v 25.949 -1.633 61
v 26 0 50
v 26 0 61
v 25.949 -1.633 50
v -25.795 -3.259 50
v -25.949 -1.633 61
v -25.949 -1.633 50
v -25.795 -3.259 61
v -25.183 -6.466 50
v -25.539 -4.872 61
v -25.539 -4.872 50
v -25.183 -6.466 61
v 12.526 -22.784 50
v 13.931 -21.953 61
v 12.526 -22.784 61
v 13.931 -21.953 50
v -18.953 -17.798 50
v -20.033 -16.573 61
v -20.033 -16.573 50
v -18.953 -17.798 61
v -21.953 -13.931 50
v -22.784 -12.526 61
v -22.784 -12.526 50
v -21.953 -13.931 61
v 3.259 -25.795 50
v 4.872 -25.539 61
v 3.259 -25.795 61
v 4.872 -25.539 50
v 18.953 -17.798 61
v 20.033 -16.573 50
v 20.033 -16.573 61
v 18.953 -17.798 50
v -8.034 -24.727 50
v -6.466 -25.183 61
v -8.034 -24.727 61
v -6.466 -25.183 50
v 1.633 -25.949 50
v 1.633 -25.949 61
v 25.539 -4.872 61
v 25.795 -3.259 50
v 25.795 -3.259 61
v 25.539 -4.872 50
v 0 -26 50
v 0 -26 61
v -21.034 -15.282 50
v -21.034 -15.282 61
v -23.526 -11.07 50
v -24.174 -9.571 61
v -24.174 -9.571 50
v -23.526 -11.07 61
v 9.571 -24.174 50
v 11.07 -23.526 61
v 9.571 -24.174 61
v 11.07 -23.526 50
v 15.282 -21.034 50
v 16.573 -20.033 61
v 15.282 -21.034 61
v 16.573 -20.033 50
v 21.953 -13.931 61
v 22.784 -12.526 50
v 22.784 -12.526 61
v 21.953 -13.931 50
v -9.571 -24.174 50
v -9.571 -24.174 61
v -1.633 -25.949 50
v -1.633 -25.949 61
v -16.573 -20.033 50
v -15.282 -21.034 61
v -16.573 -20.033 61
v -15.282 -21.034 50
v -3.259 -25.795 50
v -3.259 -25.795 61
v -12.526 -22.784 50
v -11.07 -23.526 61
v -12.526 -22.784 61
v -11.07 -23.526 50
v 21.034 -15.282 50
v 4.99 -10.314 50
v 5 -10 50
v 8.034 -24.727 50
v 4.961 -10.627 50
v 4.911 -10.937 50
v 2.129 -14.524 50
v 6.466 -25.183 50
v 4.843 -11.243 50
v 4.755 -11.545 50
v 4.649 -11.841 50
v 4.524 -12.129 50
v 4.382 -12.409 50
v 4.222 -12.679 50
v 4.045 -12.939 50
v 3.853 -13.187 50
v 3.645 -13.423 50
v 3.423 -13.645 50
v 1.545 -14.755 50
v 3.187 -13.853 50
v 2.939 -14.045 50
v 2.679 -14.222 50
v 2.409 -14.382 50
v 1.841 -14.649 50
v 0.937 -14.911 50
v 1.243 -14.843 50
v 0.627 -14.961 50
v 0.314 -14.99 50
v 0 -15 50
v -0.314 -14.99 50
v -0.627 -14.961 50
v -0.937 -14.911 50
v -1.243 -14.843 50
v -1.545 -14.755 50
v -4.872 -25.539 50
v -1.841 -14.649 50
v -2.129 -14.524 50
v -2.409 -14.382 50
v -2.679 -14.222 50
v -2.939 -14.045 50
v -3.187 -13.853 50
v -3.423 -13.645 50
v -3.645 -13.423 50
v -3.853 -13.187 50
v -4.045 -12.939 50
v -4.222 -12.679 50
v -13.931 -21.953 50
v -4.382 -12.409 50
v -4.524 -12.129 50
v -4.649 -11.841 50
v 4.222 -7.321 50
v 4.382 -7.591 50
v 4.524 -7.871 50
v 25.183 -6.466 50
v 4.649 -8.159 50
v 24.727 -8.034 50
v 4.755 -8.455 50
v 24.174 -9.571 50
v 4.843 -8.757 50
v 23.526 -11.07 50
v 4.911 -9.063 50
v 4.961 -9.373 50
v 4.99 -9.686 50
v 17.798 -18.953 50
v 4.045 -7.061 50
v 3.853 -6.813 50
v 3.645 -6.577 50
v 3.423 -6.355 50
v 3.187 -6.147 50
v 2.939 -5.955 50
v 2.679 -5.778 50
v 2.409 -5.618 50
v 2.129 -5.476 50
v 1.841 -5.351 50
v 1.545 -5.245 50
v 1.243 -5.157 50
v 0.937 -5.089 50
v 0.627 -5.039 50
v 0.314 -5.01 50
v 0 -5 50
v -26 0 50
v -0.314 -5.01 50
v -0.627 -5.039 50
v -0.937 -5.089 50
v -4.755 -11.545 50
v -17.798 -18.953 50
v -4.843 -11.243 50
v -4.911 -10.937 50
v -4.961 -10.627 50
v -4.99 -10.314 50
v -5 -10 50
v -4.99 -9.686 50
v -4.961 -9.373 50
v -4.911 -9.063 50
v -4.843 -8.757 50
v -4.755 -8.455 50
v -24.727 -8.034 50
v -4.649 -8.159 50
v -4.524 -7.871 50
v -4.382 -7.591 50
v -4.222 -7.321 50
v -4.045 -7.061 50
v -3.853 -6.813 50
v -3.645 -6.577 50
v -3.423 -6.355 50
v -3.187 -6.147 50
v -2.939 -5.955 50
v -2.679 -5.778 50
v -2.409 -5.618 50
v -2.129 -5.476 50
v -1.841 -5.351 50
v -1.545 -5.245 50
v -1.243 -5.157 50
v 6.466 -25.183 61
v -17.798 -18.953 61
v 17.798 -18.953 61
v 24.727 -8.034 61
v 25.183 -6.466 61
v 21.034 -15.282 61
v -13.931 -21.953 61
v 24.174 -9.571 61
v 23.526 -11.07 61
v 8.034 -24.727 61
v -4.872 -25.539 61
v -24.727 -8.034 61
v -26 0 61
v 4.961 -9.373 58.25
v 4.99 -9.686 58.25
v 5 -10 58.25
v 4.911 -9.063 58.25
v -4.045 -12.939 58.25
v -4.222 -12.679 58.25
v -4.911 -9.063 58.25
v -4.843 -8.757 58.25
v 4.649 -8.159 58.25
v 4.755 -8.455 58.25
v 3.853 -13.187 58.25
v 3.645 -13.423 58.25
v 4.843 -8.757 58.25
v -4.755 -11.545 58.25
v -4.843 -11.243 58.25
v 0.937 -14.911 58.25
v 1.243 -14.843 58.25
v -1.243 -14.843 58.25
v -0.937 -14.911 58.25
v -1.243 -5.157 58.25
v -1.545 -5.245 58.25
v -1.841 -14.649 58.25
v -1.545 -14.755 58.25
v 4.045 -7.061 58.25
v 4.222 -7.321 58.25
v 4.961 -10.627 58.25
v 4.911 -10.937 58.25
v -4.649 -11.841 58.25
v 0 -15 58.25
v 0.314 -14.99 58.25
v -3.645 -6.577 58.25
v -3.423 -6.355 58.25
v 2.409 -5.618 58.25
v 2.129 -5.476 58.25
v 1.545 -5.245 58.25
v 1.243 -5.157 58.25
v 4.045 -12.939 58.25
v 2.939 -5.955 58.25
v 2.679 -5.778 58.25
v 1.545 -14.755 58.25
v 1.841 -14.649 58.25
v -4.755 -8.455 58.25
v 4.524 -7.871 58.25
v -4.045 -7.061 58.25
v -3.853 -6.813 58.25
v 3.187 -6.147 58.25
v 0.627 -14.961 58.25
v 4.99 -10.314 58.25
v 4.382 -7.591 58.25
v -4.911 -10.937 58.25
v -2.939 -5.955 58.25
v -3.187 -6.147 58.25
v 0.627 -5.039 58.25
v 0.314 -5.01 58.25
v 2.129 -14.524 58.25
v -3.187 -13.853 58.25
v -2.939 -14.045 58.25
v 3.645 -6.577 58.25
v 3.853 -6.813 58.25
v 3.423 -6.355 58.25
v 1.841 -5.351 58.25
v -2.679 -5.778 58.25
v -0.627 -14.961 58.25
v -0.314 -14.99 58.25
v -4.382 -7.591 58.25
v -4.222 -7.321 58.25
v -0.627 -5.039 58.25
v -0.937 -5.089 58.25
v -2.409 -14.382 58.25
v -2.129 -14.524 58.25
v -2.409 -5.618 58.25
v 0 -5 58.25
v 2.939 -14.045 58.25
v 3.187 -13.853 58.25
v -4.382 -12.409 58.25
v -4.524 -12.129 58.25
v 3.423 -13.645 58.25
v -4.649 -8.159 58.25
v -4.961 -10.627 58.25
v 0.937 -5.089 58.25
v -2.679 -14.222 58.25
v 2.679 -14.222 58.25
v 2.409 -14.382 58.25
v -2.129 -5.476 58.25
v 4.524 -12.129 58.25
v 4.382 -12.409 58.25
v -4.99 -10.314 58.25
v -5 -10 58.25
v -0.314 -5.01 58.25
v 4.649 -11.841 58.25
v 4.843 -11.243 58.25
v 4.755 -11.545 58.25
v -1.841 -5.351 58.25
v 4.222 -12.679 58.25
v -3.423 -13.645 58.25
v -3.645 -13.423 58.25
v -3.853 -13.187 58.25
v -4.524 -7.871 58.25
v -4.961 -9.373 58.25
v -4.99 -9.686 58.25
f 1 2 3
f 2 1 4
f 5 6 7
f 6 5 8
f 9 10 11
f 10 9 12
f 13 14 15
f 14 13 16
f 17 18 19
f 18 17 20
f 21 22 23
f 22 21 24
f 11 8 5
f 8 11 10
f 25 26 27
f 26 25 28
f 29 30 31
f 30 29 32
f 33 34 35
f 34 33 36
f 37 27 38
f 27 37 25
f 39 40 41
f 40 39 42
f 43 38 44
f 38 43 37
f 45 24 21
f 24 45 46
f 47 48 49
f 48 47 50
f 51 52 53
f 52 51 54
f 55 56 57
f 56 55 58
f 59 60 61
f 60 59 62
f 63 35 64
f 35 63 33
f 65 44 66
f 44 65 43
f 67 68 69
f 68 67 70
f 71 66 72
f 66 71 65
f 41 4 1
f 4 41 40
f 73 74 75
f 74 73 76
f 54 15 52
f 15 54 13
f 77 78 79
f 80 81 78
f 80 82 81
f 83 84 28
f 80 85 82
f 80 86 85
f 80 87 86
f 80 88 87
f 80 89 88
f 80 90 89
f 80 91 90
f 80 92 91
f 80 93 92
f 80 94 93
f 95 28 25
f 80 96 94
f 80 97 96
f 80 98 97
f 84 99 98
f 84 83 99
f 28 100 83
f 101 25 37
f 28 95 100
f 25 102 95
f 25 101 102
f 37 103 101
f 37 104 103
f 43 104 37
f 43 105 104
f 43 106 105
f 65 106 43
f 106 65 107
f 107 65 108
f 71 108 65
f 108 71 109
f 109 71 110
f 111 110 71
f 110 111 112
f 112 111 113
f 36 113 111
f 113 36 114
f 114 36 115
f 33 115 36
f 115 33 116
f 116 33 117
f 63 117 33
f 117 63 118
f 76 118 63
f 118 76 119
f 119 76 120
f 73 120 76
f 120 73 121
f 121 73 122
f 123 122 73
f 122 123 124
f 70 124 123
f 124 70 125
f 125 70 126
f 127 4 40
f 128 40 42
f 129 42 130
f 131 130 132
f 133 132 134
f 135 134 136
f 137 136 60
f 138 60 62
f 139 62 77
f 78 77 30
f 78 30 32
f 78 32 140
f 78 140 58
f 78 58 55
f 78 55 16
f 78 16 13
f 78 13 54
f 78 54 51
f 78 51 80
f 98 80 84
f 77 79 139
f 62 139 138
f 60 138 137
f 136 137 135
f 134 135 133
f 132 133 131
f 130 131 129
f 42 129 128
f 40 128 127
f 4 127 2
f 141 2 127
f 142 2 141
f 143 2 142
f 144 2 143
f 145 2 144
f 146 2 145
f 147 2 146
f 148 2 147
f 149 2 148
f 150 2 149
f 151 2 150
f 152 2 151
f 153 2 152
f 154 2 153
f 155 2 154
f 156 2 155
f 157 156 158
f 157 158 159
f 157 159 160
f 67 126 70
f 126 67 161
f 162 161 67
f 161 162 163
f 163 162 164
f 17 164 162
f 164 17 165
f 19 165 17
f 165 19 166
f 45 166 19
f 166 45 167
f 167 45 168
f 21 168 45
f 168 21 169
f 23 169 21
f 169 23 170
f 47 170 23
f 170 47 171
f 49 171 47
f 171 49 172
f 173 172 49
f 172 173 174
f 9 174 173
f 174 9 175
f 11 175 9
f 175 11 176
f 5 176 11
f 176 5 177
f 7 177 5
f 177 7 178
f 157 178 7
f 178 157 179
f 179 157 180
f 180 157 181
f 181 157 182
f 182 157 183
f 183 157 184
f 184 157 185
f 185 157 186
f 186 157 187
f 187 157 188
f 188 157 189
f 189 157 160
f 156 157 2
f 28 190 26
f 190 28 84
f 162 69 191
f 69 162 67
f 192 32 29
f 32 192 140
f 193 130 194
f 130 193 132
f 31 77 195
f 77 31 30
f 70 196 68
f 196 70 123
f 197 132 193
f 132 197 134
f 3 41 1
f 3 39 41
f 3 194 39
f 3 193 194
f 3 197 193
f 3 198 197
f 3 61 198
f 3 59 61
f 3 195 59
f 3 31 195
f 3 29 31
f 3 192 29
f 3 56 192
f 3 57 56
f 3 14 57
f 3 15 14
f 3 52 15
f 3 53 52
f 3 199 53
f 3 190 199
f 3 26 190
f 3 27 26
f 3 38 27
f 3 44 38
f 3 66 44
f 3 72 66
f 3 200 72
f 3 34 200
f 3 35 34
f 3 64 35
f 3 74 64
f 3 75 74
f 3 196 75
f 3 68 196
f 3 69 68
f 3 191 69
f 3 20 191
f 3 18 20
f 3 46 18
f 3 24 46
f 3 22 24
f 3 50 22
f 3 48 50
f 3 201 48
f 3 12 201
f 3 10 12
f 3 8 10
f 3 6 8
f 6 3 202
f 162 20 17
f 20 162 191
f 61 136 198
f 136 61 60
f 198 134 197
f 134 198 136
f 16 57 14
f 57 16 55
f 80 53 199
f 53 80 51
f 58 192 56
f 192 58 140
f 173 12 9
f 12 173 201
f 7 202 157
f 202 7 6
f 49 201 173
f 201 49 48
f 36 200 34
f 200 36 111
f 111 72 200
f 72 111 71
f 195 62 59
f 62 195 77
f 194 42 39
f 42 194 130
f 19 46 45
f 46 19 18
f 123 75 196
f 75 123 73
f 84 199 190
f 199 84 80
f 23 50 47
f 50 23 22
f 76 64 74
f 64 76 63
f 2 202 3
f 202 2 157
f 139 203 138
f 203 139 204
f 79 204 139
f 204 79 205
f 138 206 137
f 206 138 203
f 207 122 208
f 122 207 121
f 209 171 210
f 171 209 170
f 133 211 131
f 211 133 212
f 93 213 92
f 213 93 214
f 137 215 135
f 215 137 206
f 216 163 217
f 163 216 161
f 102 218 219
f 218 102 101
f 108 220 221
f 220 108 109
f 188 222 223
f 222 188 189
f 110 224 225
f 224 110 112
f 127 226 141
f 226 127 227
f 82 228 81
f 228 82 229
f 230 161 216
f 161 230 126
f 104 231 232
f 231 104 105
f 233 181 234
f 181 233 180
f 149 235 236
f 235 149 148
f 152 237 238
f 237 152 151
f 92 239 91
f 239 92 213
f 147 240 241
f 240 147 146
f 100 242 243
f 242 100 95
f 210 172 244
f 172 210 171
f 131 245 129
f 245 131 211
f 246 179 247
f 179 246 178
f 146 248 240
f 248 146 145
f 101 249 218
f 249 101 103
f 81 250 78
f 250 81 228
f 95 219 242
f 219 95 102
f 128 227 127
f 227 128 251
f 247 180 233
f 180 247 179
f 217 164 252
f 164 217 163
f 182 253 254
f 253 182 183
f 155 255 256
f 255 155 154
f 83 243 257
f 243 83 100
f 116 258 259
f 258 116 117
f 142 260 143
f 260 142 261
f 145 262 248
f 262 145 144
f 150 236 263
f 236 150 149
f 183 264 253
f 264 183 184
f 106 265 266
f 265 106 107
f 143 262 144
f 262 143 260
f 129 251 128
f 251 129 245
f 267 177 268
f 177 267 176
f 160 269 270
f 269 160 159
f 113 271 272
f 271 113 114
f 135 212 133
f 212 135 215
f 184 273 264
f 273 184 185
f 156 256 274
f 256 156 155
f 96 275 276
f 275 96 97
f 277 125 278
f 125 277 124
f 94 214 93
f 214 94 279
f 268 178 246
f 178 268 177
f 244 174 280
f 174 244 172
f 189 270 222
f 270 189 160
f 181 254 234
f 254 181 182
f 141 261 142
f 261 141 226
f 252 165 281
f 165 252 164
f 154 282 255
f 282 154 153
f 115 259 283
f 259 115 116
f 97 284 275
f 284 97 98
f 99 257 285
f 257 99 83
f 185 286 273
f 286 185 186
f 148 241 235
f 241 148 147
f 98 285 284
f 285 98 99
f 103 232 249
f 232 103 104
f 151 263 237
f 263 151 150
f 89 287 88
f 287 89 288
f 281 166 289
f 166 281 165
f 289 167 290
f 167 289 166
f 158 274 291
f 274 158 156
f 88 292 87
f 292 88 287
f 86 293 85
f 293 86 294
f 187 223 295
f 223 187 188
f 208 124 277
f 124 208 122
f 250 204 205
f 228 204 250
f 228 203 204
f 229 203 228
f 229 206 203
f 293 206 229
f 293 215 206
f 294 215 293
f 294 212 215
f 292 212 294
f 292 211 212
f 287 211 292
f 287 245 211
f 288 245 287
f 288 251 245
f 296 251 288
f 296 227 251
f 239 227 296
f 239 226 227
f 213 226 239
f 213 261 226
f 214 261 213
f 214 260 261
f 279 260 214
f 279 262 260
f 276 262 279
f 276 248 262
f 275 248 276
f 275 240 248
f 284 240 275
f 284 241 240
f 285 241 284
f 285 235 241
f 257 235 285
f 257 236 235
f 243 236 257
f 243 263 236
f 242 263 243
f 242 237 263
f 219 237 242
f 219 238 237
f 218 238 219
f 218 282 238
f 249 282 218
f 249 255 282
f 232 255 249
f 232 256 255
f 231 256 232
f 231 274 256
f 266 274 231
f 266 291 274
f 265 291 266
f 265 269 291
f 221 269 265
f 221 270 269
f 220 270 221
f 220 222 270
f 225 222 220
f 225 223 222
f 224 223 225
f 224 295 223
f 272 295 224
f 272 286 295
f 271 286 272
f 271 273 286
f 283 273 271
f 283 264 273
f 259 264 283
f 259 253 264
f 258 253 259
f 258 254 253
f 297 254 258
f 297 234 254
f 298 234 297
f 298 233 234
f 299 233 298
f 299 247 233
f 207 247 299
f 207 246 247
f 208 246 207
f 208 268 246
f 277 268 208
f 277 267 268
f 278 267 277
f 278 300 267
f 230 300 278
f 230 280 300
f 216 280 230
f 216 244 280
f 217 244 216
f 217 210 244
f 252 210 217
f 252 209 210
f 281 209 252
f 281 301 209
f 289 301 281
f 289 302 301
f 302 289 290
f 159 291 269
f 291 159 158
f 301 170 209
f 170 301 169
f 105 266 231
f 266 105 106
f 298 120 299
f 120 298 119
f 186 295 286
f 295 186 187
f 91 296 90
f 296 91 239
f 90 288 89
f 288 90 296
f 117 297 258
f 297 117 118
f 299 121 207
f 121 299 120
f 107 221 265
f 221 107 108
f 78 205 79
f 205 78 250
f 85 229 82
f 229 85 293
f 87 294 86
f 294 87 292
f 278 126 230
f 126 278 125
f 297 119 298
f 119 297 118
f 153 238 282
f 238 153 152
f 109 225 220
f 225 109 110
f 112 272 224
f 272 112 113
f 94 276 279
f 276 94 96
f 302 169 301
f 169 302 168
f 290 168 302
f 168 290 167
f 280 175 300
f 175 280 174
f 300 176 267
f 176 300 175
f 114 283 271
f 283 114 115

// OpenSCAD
$fn=100;
//import("files/Minimalist_Laser_Microscope_End_Cap.stl");
/*
translate([0,-27,0]){
import("files/Minimalist_Laser_Microscope_Body.stl");
}
*/
/*

difference(){
    translate(v=[-18,0, 8.85]){
        rotate(90, [0,1,0]){
           cylinder(h = 14, r = 8);
            }
        }///trnaslate end
    translate(v=[-18,0, 8.85]){
        rotate(90, [0,1,0]){
           cylinder(h = 14, r = 5.1);
            }
        }///trnaslate end
            
}//difference end
*/





ech = 11; // cylinder end cap height
ecr = 26 ; // cylinder end cap radius

laserRadius = 5; // laser radius
syringeRadius = 16.5 / 2 ; // srynge radius
syringeRadius1 = 9.5 /2  ; // srynge radius at syringeHeight1
syringeRadius2 = 2  ; // srynge radius at syringeHeight1

syringeHeight = 58.5 ; // srynge height
syringeHeight1 = 10; //
syringeHeight2 = 23; //
syringeHeight3 = 25; //

module cap(){
    translate(v=[0,0,50]){
        difference(){
            cylinder(h = ech, r = ecr);
            translate(v=[-ecr,0,0]){
                cube([ecr*2, ecr, ech]);
            }
            translate(v=[0,-laserRadius - 5, 0]){
                cylinder(h = ech *3 / 4., r = laserRadius);
            }
        }
    }
}


module front(){
    translate(v=[0,0,-50]){ // t1
        difference(){
            //base
            union(){ //u1
                cylinder(h = 2.5*ech, r = ecr);
                translate(v=[0,-laserRadius - 5, ecr/4 + 4]){
                    rotate(90, [1,0,0]){
                        cylinder(h = syringeHeight, r = syringeRadius+2);
                    }
                }
            } //union u1end  

            translate(v=[-ecr*1.5,0,0]){
                cube([ecr*2.5, ecr, 2.5*ech]);
            }
            //laser hole
            translate(v=[0,-laserRadius - 5, ech*2-2.5]){
                cylinder(h = ech *3 / 4., r = laserRadius);
            }
            //pasing laser hole
            translate(v=[0,-laserRadius - 5, 0]){
                cylinder(h = ech*2.5, r = laserRadius*3/4.);
            }
            //srynge level 1
            translate(v=[0,-laserRadius - 5 - syringeHeight + syringeHeight1 , ecr/4 + 4]){
                rotate(90, [1,0,0])
                    cylinder(h = syringeHeight1, r = syringeRadius);
                }
            //srynge level 2
            translate(v=[0,-laserRadius - 5 - syringeHeight + syringeHeight1 + syringeHeight2  , ecr/4 + 4]){
                rotate(90, [1,0,0])
                    cylinder(h = syringeHeight2, r = syringeRadius1);
                }
            //srynge level 3
            translate(v=[0,-laserRadius - 5 - syringeHeight + syringeHeight1 + syringeHeight2  + syringeHeight3  , ecr/4 + 4]){
                rotate(90, [1,0,0])
                    cylinder(h = syringeHeight3, r = syringeRadius2);
                }
        } // difference end

        
  } // translate t1 end
}

cap();
//front();
